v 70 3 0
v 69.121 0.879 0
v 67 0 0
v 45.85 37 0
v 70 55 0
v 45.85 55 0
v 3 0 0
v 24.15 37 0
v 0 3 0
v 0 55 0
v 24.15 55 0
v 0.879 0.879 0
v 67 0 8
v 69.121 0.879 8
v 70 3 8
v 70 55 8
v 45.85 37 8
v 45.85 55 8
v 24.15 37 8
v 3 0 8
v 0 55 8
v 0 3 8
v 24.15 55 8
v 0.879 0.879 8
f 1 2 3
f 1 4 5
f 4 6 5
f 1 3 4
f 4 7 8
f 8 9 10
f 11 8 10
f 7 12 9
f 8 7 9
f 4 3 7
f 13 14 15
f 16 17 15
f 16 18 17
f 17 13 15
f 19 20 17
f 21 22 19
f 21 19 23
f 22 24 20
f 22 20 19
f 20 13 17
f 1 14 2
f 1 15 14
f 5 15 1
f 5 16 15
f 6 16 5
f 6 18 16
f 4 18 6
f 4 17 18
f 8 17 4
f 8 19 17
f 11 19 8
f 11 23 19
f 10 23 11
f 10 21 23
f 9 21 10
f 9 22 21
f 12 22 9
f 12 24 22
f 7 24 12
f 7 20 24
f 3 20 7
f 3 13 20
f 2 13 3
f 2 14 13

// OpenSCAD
$fn = 32;

// ----------------------------------------------------------------------
// Window plate: 70 x 55 mm, 1 open windows
// ----------------------------------------------------------------------

// --- parameters (mm) ---
profile_height = 8;       // extrusion height
profile_points = 12;      // points of the closed outline

profile = [[0, 3], [0.879, 0.879], [3, 0], [67, 0], [69.121, 0.879], [70, 3], [70, 55], [45.85, 55], [45.85, 37], [24.15, 37], [24.15, 55], [0, 55]];  // single closed polygon, 12 points, counter clockwise

// --- the one profile operation ---
linear_extrude(height = profile_height) polygon(points = profile);
